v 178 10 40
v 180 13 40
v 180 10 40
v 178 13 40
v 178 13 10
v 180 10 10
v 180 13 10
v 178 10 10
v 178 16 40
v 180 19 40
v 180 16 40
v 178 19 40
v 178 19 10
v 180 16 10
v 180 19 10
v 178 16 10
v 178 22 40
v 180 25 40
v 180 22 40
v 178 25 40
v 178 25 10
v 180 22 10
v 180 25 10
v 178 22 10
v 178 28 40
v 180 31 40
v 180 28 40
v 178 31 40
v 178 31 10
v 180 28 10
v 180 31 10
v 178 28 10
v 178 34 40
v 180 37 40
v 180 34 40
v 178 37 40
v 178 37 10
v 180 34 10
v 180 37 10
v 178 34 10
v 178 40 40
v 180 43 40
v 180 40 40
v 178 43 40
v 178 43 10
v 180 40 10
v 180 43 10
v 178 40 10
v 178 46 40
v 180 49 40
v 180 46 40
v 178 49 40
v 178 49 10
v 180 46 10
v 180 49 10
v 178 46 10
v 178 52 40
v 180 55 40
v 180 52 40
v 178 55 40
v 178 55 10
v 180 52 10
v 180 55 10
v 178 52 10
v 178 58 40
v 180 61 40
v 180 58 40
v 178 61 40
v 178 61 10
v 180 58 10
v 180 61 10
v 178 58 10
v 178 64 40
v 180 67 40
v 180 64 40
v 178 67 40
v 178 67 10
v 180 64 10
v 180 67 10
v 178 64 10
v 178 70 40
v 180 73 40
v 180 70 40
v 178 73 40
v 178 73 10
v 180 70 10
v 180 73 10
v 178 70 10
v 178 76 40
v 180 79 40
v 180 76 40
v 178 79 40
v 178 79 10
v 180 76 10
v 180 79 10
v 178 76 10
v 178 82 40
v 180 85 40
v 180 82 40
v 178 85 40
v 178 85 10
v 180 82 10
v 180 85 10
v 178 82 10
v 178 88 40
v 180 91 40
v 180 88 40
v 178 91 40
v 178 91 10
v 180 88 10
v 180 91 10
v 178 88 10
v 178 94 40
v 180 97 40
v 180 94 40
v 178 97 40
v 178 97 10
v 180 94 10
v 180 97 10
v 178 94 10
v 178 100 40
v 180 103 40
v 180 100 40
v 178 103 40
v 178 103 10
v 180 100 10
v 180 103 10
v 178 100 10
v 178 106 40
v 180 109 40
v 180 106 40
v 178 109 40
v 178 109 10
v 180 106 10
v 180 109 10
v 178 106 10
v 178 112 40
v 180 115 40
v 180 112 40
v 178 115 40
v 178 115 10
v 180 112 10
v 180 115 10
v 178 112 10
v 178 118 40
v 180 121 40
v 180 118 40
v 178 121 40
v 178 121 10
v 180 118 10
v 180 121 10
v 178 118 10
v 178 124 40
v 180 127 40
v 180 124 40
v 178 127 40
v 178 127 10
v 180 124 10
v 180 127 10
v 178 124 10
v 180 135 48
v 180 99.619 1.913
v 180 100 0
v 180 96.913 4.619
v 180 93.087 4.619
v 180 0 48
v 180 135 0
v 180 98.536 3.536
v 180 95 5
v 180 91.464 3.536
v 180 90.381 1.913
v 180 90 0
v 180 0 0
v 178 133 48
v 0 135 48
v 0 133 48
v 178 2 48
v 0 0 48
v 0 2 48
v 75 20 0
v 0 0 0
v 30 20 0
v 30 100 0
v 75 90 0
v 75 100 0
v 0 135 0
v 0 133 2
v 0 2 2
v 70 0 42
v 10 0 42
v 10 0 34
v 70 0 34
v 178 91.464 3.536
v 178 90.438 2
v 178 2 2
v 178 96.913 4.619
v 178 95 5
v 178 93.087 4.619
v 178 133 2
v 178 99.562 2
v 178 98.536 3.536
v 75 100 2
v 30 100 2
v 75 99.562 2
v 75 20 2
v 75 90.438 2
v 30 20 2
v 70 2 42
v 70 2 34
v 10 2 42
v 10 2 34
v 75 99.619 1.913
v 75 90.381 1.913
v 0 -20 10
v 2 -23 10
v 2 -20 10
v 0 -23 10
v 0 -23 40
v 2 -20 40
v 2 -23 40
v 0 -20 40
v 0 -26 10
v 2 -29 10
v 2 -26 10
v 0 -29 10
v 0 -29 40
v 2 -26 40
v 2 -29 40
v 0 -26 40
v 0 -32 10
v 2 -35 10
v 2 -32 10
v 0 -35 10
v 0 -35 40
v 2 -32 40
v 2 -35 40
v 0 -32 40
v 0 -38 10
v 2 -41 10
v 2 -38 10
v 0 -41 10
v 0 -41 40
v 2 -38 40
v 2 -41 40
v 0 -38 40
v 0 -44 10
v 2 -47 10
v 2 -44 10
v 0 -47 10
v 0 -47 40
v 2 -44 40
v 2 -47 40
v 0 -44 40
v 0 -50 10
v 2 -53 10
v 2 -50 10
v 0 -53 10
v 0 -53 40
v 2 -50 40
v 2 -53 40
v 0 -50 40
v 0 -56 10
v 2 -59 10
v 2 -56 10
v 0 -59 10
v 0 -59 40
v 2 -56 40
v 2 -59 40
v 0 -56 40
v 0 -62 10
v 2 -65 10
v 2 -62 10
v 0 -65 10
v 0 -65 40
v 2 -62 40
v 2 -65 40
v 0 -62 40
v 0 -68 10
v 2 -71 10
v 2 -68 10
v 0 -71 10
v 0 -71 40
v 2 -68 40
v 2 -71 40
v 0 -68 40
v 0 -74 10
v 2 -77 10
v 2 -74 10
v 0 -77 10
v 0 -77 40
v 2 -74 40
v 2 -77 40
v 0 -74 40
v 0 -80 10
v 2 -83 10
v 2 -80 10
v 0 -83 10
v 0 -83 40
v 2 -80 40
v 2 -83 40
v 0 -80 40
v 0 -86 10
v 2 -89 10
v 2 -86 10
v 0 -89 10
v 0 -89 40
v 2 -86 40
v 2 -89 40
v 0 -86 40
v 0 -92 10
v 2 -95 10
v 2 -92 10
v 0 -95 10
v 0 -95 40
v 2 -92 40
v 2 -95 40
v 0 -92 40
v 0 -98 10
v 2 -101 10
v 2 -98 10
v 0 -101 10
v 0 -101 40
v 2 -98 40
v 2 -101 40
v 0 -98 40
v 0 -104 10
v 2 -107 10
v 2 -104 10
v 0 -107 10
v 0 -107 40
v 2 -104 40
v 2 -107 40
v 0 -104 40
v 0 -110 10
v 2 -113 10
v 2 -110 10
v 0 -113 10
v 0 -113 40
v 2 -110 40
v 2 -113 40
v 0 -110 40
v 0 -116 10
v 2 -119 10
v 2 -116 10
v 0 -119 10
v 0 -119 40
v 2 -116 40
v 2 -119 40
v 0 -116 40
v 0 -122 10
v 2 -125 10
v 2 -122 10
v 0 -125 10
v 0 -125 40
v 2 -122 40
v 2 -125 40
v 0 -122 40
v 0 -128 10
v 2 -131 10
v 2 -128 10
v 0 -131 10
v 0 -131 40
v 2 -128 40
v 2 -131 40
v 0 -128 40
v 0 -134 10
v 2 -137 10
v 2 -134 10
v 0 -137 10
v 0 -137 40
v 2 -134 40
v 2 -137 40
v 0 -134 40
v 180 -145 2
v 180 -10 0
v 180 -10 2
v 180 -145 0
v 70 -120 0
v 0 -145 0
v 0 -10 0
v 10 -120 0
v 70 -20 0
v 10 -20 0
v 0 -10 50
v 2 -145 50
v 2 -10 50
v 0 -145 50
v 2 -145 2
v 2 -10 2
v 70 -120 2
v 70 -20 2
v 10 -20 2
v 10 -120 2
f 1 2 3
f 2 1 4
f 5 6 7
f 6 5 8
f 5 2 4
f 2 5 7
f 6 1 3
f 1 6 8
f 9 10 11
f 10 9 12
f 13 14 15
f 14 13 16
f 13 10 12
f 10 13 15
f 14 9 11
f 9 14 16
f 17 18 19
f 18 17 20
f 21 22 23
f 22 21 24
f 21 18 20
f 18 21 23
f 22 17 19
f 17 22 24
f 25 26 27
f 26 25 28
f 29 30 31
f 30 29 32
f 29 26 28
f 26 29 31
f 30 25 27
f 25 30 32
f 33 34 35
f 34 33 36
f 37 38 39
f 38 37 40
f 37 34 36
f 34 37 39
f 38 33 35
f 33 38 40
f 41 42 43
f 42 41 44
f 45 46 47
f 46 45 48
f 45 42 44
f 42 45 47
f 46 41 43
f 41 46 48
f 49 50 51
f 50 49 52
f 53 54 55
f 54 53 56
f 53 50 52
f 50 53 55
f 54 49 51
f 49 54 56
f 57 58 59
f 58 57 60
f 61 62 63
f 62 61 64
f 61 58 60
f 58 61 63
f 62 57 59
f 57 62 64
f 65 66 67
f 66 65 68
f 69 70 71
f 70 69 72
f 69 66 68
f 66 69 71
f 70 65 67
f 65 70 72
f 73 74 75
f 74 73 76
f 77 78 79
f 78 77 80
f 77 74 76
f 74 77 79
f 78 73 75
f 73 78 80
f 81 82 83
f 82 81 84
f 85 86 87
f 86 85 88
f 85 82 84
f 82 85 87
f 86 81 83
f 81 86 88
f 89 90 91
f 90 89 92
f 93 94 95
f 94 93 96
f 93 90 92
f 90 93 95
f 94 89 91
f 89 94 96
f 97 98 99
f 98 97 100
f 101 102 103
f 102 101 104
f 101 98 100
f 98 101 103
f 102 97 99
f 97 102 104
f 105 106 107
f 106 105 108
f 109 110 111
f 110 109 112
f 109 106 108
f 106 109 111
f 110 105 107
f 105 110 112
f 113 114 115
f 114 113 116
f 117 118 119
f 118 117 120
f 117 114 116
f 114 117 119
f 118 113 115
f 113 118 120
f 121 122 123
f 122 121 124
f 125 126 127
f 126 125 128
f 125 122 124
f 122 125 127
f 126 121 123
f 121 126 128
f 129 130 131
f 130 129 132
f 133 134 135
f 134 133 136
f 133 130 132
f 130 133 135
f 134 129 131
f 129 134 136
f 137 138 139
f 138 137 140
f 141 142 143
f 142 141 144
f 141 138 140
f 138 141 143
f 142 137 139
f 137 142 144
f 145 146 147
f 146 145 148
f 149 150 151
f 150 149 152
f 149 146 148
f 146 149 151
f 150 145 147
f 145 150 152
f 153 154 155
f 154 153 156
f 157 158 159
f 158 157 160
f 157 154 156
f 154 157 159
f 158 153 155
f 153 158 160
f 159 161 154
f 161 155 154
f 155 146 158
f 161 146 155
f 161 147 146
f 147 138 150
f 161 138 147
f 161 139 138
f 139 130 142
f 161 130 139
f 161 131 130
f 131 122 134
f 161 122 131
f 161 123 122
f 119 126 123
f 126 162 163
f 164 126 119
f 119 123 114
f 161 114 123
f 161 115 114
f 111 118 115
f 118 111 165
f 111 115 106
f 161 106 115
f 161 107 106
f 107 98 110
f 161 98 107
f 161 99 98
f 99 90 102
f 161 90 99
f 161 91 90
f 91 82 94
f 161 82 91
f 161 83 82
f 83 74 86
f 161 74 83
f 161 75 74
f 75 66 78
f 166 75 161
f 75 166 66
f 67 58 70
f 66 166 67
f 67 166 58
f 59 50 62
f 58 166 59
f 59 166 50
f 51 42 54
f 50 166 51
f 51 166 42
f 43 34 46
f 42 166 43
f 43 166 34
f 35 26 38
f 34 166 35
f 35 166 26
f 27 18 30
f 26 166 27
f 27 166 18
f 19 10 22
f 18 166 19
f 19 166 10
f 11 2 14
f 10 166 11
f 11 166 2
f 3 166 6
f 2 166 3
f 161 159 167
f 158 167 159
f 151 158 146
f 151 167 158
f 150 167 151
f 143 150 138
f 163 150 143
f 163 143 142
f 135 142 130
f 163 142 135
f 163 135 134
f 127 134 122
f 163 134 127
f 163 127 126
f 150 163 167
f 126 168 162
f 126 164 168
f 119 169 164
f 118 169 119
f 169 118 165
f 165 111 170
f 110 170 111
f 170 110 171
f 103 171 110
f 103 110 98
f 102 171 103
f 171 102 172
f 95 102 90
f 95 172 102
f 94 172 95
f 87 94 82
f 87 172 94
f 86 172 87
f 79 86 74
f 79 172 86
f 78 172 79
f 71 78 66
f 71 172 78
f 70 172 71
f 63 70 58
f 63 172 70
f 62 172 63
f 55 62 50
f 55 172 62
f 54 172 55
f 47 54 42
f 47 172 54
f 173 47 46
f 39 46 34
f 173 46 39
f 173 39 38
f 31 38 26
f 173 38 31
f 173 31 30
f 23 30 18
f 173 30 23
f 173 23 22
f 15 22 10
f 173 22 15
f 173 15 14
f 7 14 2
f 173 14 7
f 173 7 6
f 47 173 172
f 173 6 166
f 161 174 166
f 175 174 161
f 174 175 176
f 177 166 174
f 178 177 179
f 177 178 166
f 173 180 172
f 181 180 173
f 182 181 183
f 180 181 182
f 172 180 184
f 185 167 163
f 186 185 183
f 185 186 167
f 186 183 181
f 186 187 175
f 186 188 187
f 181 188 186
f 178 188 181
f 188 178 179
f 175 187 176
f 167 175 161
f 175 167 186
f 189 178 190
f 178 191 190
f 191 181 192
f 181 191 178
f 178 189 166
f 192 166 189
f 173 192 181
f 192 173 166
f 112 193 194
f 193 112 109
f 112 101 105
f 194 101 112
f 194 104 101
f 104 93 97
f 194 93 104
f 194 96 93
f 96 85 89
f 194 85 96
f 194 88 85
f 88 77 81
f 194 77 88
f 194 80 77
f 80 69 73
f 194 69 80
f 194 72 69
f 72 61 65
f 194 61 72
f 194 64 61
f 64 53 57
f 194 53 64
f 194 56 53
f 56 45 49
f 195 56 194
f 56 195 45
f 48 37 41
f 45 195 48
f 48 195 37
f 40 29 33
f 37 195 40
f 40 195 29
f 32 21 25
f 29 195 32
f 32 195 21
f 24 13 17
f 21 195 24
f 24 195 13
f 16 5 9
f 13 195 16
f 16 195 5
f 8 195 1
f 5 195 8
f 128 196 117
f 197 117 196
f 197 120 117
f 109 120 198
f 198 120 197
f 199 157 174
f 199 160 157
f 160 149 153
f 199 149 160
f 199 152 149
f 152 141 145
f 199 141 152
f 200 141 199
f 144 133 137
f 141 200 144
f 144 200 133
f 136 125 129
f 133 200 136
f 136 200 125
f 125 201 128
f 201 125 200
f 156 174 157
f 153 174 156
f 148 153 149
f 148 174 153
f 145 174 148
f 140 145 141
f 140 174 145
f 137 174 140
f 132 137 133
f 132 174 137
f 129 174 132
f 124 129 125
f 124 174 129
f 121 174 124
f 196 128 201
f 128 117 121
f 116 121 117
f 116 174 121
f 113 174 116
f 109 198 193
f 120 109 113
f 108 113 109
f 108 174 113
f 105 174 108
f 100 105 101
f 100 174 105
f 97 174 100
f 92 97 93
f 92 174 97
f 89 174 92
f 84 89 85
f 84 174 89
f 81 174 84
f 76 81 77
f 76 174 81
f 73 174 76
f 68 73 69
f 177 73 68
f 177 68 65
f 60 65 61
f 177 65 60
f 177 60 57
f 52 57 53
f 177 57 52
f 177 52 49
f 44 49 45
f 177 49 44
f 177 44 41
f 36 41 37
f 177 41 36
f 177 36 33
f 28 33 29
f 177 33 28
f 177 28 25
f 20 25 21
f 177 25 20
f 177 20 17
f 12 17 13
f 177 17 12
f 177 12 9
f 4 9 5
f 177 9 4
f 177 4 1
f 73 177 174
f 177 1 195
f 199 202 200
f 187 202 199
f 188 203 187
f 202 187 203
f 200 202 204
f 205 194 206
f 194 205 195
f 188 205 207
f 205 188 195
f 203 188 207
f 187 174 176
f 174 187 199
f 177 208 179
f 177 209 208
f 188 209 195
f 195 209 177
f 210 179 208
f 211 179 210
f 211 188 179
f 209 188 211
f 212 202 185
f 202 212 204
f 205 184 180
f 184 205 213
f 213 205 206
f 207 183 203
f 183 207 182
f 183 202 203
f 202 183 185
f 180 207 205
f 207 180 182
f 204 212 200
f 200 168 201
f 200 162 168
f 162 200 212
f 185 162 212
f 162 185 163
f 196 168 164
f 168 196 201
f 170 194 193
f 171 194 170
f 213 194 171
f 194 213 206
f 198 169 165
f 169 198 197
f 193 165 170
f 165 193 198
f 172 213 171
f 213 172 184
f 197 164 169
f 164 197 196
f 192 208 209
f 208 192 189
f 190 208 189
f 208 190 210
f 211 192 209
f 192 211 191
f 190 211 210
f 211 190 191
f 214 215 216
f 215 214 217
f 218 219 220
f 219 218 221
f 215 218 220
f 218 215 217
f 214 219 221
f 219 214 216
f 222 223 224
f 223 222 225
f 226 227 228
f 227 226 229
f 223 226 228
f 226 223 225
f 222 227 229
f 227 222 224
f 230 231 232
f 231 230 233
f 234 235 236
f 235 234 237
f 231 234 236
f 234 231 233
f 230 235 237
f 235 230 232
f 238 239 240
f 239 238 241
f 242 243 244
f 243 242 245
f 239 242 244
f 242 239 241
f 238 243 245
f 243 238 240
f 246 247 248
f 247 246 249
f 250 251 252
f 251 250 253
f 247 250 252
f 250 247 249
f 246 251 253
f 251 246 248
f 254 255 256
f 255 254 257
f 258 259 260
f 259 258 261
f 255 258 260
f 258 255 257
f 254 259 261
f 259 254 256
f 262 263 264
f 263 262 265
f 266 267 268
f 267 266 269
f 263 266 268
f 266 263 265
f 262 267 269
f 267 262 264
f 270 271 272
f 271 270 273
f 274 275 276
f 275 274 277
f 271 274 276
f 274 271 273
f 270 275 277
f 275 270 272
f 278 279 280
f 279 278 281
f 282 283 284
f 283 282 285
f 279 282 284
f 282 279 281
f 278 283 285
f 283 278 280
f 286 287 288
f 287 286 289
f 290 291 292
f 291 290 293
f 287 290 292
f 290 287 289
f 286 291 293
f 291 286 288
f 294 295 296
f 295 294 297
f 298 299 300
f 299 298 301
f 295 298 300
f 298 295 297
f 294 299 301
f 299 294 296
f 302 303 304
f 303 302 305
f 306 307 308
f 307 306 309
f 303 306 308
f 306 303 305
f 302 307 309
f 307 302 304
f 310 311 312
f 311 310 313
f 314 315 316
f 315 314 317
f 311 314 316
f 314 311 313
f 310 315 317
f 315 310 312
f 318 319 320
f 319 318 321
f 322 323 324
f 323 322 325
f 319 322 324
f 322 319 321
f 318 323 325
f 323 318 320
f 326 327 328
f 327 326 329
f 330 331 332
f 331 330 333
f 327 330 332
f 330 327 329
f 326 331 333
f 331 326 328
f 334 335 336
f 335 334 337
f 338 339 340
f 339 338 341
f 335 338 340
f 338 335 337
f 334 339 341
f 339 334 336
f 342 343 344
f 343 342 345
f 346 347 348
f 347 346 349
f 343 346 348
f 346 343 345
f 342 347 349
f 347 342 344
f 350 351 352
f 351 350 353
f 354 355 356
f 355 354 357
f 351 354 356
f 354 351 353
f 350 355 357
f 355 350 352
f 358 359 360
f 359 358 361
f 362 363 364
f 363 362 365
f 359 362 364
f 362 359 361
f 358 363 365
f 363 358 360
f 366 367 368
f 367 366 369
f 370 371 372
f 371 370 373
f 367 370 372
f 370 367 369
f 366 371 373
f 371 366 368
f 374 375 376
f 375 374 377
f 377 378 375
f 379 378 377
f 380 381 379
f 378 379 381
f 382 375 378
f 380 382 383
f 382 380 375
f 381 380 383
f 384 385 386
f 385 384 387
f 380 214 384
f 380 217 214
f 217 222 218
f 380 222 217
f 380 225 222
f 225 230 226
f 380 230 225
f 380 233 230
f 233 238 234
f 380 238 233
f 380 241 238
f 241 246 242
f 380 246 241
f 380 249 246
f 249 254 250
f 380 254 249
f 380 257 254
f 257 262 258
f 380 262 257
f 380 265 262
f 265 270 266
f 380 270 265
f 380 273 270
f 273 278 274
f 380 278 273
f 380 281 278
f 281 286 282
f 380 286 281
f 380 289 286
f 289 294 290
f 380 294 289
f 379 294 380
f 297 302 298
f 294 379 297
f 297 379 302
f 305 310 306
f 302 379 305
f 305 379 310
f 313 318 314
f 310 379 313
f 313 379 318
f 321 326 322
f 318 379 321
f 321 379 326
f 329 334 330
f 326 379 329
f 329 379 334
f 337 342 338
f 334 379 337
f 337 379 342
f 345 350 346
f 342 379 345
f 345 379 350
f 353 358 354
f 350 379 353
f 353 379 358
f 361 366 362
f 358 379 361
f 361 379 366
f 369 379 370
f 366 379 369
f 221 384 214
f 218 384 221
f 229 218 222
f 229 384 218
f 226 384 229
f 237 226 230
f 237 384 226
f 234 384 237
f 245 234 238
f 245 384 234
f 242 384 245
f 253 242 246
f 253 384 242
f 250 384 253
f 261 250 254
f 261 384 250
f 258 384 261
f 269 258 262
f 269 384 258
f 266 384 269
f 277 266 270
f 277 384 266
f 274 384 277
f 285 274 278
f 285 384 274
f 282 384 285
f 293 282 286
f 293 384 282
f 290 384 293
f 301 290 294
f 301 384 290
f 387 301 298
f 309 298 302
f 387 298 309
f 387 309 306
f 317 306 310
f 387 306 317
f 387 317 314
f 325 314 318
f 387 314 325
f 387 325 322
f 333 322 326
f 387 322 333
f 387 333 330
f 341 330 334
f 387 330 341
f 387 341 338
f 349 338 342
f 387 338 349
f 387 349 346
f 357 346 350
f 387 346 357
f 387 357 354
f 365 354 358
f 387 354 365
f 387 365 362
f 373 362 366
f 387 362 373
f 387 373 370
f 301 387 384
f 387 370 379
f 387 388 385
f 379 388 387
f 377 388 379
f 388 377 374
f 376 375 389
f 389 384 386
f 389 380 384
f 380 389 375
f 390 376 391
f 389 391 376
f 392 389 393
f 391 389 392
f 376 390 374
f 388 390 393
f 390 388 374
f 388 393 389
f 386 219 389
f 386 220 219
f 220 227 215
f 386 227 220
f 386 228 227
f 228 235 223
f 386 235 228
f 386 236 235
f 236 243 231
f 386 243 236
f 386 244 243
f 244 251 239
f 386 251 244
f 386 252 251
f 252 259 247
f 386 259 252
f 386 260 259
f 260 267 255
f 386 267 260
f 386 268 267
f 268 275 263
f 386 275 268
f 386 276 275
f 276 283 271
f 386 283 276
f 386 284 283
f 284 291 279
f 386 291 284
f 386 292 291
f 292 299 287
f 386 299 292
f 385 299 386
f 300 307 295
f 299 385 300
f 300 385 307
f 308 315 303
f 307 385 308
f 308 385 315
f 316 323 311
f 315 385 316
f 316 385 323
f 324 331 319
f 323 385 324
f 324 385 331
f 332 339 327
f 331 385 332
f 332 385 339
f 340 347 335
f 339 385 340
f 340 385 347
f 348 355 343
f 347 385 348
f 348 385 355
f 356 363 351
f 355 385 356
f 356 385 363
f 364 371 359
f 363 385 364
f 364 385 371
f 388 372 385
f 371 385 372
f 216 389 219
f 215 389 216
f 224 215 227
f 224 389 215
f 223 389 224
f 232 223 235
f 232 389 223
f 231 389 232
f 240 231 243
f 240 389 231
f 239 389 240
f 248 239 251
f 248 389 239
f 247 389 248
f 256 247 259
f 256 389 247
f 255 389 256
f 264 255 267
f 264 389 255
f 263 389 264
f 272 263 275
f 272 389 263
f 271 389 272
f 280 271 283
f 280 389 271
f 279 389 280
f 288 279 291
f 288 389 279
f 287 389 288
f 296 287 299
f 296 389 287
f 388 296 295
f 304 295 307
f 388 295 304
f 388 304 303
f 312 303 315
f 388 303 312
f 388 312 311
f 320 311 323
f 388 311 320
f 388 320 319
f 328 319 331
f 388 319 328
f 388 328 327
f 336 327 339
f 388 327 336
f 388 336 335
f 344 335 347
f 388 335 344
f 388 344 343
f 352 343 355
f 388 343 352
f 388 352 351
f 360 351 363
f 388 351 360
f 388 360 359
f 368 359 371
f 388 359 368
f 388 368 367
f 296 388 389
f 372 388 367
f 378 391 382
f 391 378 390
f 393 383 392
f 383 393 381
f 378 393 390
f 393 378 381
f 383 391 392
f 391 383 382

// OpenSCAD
width = 135;
height = 180;
depth = 50;

wallThickness = 2;



difference() {
    cube([height, width, depth - wallThickness]);
        // general box
    translate([-1, wallThickness, wallThickness])
        cube([height - wallThickness + 1, width - (2 * wallThickness) , depth + 1]);
        // bottom hole
    translate([30, 20, -1])
        cube([45, 80, wallThickness * 2]);
    translate([40, 100 - 5, 0]) rotate([90, 0, 90])
        cylinder(h = height, r = 5);
        // cover ridge
    translate([2, 2, height - 2])
        cube([height - 4, width - 4, 5]);
        // side buttons hole
    translate([10, -1, depth - 16])
        cube([60, 10, 8]);
    
        // ventilation bottom
    for (i = [0 : (width / 7)]){
        translate([height - wallThickness - 1, 10 + (i * 6), 10])
            cube([5, 3, depth - 20]);
    }    
}


// cover
color("blue")
//translate([0, width + 20, 0])
rotate([180, 0, 0]) translate([0, 10, -depth])
difference() {
    cube([height, width, depth]);
    translate([wallThickness, -1, -1])
        cube([height, width + 2, depth - wallThickness + 1]);
    
    // screen hole
    translate([10, 10, depth - wallThickness - 1])
        cube([60, 100, wallThickness * 2]);
    
        // ventilation top
    for (i = [0 : (width / 7)]){
        translate([-1, 10 + (i * 6), 10])
            cube([5, 3, depth - 20]);
    }

}
